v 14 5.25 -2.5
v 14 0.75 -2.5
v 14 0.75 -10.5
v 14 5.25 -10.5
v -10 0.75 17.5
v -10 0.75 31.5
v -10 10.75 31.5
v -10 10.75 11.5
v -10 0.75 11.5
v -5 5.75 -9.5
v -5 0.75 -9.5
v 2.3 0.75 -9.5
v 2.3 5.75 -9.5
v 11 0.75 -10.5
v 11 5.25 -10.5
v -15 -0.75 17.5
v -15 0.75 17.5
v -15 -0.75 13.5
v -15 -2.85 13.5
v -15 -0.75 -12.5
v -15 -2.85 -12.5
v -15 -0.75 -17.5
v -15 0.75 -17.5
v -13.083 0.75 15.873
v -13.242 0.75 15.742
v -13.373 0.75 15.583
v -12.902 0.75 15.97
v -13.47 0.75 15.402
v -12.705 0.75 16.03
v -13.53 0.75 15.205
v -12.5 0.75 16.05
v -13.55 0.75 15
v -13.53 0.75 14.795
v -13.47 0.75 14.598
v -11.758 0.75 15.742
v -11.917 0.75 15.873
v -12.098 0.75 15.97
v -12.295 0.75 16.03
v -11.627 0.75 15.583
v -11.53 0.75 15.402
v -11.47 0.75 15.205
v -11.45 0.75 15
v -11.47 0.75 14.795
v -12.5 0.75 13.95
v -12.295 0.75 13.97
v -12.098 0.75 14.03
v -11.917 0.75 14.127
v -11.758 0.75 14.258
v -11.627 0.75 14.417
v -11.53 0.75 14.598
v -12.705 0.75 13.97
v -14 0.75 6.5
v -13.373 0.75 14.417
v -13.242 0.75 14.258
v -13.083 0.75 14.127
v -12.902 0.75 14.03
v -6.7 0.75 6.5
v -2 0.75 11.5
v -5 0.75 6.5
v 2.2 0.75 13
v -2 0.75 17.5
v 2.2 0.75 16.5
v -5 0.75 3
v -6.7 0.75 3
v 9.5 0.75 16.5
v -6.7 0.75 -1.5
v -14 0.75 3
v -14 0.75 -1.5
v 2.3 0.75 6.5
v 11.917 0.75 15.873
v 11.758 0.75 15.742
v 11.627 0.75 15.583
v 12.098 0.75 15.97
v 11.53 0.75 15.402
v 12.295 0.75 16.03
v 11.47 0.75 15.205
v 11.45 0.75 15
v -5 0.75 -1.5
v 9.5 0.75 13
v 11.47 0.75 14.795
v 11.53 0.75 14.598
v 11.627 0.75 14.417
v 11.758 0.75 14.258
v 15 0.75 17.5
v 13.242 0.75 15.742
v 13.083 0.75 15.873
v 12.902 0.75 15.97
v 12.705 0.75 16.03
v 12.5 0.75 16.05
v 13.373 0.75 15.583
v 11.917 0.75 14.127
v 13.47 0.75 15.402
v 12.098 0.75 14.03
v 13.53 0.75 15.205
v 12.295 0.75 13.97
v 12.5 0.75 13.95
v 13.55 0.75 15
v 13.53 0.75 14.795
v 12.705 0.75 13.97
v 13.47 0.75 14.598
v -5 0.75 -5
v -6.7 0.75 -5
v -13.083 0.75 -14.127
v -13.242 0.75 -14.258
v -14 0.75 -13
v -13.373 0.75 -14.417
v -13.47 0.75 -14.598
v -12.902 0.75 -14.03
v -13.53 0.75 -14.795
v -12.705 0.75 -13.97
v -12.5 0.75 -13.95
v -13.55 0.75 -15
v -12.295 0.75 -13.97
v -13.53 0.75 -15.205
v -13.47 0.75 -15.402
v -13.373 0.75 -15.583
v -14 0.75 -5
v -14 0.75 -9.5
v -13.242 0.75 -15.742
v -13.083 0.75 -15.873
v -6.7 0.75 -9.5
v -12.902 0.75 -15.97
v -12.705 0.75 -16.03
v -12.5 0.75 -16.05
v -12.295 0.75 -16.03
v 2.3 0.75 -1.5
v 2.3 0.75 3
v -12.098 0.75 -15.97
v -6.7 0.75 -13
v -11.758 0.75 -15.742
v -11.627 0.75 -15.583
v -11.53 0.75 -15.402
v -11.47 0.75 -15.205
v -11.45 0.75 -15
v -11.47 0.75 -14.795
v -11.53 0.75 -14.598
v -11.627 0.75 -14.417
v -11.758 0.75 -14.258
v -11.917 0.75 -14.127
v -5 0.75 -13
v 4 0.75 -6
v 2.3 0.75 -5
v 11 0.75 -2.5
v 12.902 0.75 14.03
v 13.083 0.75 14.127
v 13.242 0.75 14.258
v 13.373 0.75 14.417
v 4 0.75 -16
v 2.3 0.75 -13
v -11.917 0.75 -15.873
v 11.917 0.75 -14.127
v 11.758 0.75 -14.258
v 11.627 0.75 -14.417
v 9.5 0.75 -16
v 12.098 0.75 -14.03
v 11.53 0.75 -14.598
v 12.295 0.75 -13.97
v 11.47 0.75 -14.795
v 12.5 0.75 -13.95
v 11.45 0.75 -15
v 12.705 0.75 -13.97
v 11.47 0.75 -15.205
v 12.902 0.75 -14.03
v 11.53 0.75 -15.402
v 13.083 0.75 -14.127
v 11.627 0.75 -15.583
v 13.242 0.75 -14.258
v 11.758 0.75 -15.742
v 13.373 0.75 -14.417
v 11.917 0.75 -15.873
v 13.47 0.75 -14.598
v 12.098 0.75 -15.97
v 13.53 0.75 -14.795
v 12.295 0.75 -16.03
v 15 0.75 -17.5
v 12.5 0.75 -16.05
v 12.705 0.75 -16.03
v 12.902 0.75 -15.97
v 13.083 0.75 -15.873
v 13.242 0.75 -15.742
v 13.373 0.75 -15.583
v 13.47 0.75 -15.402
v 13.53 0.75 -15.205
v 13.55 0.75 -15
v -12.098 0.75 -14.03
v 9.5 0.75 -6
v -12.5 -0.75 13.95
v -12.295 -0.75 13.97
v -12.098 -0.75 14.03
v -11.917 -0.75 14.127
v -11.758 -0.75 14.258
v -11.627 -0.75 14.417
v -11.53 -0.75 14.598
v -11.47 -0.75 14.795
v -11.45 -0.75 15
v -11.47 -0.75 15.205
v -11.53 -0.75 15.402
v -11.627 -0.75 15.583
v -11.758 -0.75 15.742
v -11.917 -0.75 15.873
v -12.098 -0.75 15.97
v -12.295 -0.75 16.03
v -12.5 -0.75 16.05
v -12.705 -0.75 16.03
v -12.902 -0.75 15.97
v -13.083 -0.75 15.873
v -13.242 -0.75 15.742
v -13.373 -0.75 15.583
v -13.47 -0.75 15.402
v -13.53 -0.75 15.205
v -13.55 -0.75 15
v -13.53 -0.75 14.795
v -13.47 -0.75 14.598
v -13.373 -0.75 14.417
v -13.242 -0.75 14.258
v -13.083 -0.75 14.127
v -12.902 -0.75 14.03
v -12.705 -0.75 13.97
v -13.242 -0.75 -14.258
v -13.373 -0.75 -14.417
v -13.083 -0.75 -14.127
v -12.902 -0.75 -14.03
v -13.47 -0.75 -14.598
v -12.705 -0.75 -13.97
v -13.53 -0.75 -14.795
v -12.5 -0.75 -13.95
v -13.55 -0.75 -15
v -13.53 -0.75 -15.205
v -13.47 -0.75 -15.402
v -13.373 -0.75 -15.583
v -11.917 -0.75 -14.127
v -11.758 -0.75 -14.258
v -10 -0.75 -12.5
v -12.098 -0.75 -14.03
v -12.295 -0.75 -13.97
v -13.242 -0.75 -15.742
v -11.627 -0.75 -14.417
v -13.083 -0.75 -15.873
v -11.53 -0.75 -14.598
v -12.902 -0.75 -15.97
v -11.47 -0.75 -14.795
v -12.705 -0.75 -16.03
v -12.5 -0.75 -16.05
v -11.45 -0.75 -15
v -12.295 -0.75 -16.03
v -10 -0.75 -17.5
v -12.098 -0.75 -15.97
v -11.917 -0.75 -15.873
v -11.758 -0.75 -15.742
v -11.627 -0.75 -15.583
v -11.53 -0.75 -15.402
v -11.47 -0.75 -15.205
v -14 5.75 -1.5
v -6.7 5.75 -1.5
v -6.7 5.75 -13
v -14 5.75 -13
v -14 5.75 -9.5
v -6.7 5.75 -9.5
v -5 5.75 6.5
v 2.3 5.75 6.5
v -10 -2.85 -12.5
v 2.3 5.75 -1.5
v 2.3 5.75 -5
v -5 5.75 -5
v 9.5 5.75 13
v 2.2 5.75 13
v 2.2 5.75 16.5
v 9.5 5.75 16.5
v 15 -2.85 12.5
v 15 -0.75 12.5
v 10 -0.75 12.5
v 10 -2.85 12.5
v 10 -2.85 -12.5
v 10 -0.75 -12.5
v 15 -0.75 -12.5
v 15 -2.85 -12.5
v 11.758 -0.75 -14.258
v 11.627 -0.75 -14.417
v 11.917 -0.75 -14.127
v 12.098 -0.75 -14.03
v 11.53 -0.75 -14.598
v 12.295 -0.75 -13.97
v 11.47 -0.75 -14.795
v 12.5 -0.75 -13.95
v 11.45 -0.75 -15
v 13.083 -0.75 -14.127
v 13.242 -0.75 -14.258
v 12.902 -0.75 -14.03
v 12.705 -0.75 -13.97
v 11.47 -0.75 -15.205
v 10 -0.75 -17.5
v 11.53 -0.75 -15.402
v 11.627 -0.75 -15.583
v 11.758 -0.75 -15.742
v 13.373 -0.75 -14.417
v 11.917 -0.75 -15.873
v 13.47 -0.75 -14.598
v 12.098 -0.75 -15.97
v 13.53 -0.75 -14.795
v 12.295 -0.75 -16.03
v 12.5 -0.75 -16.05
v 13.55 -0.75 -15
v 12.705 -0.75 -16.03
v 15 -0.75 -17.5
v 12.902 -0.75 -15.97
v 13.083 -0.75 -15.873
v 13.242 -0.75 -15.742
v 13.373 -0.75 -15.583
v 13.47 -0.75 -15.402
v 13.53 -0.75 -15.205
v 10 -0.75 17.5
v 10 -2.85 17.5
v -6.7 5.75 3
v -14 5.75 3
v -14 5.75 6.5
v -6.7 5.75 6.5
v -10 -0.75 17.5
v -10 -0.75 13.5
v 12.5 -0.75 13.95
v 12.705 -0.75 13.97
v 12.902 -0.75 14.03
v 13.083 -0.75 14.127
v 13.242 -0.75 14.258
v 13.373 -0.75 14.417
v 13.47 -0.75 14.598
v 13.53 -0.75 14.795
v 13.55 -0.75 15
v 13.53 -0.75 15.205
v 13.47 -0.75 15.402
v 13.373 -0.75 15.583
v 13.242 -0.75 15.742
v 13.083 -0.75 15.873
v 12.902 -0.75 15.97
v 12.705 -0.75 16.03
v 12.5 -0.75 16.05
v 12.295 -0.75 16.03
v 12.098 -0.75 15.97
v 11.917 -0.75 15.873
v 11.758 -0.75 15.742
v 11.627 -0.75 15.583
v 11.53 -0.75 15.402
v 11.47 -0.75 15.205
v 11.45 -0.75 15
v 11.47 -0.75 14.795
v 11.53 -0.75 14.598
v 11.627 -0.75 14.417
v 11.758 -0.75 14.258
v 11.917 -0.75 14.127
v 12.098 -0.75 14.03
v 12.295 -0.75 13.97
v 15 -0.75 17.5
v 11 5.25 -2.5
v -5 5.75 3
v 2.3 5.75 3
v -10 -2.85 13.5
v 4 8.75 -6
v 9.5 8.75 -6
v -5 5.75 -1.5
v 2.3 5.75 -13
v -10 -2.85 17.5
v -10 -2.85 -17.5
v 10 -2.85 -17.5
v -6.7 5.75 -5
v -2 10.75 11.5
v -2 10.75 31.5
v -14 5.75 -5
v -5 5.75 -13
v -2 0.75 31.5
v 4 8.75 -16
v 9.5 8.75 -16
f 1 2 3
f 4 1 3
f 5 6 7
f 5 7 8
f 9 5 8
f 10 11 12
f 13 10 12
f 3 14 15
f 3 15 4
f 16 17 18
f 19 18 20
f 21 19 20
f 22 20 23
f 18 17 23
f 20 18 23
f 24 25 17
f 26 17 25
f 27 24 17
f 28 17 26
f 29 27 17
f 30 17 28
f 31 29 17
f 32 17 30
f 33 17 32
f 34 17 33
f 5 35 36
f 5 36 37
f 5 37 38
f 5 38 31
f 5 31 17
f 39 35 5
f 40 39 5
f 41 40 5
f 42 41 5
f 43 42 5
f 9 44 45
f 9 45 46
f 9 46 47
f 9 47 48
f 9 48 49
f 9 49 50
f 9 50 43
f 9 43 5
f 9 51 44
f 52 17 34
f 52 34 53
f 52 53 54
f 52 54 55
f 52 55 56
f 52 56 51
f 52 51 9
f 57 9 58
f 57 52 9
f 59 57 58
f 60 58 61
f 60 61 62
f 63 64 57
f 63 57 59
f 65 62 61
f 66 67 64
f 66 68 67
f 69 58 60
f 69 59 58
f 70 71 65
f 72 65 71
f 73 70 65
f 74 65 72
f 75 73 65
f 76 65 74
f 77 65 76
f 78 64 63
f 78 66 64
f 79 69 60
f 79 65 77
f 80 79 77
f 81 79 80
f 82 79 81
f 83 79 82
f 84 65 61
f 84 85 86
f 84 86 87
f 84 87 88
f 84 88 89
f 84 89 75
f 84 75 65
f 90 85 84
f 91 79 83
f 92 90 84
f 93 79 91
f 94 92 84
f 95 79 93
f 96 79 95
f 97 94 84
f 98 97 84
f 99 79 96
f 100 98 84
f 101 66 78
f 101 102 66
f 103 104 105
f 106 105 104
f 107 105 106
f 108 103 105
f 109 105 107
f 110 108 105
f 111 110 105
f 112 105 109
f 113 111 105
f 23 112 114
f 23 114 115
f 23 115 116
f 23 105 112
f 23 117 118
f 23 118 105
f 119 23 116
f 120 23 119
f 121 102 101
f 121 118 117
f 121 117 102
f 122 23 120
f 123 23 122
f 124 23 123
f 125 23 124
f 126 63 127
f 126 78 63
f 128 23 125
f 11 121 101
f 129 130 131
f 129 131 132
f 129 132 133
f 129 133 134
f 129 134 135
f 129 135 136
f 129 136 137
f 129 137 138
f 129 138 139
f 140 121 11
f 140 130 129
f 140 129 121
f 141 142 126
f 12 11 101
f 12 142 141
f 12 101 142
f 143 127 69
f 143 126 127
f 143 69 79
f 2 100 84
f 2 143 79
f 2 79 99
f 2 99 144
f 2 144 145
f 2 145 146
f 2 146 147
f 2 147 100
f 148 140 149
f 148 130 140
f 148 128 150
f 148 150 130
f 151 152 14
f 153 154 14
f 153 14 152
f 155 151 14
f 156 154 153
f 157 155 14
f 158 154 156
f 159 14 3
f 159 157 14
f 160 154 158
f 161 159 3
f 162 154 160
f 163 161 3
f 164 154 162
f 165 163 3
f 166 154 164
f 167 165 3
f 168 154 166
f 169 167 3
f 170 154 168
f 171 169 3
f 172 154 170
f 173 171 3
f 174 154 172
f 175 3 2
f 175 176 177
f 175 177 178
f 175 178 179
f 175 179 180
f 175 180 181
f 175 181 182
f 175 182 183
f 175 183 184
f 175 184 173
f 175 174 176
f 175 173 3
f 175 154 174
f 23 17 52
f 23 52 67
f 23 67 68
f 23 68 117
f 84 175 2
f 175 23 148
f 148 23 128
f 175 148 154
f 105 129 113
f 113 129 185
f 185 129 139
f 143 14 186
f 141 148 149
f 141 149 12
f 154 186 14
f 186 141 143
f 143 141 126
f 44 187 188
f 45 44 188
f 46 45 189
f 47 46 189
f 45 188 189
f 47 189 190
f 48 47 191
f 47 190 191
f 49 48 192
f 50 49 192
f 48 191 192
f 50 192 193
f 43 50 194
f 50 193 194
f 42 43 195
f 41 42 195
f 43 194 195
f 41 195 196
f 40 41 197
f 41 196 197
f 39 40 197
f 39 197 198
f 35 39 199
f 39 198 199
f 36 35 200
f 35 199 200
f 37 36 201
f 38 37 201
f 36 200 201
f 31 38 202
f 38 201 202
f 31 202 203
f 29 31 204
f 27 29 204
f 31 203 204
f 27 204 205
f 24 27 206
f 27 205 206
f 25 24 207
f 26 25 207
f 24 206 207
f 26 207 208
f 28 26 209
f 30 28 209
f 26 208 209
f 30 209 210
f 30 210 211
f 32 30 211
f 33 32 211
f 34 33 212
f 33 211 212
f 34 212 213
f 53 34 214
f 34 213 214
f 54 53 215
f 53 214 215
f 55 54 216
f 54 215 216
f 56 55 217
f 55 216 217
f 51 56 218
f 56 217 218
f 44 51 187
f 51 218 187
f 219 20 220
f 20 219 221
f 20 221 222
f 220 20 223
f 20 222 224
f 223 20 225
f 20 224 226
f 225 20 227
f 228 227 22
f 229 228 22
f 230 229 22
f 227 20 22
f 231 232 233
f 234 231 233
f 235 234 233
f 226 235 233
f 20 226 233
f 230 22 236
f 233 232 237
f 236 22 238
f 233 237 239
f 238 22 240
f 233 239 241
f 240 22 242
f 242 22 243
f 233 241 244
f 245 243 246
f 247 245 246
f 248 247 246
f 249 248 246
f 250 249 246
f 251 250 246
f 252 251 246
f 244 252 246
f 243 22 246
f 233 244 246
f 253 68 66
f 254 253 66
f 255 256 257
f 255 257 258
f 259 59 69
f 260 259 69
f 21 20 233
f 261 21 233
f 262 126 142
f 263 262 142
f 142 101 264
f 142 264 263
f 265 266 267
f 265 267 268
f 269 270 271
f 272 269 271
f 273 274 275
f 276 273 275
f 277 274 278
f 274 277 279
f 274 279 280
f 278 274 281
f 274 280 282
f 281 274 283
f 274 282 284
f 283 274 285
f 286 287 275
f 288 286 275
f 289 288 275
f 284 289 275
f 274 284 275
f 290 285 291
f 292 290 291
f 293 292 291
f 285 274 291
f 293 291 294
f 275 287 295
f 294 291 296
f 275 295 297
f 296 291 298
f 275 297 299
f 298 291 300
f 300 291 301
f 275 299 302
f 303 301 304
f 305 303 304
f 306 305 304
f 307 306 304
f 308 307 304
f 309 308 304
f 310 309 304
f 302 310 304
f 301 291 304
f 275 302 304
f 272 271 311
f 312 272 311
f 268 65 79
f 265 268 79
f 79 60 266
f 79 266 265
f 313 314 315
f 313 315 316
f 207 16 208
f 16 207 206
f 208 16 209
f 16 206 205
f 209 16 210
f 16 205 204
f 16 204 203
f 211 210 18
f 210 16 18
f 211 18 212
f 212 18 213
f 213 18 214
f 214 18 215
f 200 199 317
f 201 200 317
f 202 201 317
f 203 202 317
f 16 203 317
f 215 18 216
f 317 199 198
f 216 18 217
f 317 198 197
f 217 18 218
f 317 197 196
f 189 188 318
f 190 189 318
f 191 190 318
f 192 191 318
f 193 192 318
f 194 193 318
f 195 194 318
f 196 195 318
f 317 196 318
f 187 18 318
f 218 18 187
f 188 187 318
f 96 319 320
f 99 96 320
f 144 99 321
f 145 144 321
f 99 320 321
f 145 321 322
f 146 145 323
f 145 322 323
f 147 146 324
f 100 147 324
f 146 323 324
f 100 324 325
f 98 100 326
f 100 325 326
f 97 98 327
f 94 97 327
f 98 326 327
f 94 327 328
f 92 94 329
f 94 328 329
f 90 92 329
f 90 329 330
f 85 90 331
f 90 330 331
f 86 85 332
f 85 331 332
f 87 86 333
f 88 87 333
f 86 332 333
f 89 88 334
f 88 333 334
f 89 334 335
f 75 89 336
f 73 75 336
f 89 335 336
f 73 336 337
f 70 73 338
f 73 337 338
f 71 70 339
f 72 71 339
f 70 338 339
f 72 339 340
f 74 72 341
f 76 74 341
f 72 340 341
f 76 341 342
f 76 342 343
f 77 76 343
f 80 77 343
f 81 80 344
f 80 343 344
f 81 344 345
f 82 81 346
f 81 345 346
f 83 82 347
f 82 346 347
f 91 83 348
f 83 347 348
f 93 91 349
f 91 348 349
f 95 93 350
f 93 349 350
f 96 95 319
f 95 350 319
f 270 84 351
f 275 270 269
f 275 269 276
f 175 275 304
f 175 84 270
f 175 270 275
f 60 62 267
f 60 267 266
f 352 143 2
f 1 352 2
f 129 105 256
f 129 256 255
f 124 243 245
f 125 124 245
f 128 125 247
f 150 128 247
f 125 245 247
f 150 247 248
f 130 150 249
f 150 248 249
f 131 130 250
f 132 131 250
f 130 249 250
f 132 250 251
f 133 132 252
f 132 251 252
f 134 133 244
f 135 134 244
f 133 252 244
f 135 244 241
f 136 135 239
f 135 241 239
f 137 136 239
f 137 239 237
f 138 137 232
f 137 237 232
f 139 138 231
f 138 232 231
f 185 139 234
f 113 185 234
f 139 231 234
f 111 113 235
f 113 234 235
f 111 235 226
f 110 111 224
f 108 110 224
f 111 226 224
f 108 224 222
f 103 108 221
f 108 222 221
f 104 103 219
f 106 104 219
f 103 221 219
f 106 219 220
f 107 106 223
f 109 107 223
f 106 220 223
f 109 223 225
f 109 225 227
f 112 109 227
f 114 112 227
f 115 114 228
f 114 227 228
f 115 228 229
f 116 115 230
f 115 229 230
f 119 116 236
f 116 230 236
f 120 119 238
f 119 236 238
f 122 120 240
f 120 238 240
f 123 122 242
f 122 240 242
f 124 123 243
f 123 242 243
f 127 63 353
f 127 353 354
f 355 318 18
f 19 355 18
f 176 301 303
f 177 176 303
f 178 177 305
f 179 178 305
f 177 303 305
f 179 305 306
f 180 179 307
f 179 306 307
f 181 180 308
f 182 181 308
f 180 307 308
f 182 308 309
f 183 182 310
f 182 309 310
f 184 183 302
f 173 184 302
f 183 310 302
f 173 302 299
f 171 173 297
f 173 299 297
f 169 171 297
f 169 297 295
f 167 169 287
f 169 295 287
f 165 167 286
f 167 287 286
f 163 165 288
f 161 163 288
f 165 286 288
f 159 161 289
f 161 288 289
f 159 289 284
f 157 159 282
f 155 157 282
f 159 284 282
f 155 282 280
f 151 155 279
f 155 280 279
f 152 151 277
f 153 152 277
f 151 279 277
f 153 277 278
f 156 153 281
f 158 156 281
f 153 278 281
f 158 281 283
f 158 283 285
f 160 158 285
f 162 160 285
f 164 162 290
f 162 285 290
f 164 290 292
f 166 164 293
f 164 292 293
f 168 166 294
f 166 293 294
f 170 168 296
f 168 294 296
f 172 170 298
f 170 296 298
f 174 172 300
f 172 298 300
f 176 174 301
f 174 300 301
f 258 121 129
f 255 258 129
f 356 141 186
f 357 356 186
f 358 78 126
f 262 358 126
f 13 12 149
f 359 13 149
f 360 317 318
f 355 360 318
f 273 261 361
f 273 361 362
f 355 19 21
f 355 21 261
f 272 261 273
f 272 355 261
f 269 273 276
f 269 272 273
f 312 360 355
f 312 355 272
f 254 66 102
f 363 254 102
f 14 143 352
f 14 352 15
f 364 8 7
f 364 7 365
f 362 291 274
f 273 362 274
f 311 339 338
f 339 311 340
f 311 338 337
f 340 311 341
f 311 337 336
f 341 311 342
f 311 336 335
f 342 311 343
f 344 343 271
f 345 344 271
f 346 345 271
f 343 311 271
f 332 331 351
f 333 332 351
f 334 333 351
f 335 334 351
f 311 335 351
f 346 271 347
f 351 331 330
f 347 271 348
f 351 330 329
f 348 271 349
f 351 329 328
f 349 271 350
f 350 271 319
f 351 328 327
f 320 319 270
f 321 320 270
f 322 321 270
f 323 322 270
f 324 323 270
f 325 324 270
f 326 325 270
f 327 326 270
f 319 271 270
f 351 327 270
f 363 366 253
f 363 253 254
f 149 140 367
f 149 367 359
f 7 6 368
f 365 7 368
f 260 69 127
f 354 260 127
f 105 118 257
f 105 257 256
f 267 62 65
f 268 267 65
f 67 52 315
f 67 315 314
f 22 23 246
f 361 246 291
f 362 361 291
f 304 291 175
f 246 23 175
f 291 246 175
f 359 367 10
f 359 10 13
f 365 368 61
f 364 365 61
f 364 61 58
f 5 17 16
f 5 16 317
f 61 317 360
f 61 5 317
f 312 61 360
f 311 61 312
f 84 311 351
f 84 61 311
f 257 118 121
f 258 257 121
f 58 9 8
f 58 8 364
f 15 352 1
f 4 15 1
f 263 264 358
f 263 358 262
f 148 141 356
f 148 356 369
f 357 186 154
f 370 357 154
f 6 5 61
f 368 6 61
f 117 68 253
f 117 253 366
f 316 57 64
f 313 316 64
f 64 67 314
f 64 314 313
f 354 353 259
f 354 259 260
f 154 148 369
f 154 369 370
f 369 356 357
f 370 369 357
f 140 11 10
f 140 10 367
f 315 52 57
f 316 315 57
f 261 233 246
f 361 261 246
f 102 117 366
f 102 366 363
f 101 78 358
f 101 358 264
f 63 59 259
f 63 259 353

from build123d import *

# Parameters (mm, degrees)
SKETCH_1_W                       = 30
SKETCH_1_H                       = 35
EXTRUDE_1_DEPTH                  = 0.75
SKETCH_2_R                       = 1.05
CUT_EXTRUDE_1_DEPTH              = 1.5
EXTRUDE_2_DEPTH                  = 2.1
SKETCH_4_W                       = 7.3
SKETCH_4_H                       = 3.5
EXTRUDE_3_DEPTH                  = 5
SKETCH_5_W                       = 7.3
SKETCH_5_H                       = 3.5
EXTRUDE_4_DEPTH                  = 5
PATTERN_LINEAR_1_COUNT           = 2
PATTERN_LINEAR_1_PITCH           = 9
PATTERN_LINEAR_2_COUNT           = 3
PATTERN_LINEAR_2_PITCH           = 8
PATTERN_LINEAR_2_COPY_1_SKETCH_W = 7.3
PATTERN_LINEAR_2_COPY_1_SKETCH_H = 3.5
PATTERN_LINEAR_2_COPY_1_DEPTH    = 5
PATTERN_LINEAR_2_COPY_2_SKETCH_W = 7.3
PATTERN_LINEAR_2_COPY_2_SKETCH_H = 3.5
PATTERN_LINEAR_2_COPY_2_DEPTH    = 5
SKETCH_6_W                       = 3
SKETCH_6_H                       = 8
EXTRUDE_5_DEPTH                  = 4.5
SKETCH_7_W                       = 8
SKETCH_7_H                       = 20
EXTRUDE_6_DEPTH                  = 10
SKETCH_8_W                       = 5.5
SKETCH_8_H                       = 10
EXTRUDE_7_DEPTH                  = 8


with BuildPart() as part:
    # ｽｹｯﾁ1 → ﾎﾞｽ - 押し出し1 (new, symmetric)
    with BuildSketch(Plane(origin=(0, 0, 0), x_dir=(1, 0, 0), z_dir=(0, 1, 0))):
        Rectangle(SKETCH_1_W, SKETCH_1_H)
    extrude(amount=EXTRUDE_1_DEPTH, both=True)

    # ｽｹｯﾁ2 → ｶｯﾄ - 押し出し1 (cut)
    with BuildSketch(Plane.XZ.offset(0.75)):
        with Locations(Location((-12.5, 15, 0), (0, 0, 270))):
            Circle(SKETCH_2_R)
        with Locations(Location((-12.5, -15, 0), (0, 0, 270))):
            Circle(SKETCH_2_R)
        with Locations(Location((12.5, 15, 0), (0, 0, 270))):
            Circle(SKETCH_2_R)
        with Locations(Location((12.5, -15, 0), (0, 0, 270))):
            Circle(SKETCH_2_R)
    extrude(amount=-CUT_EXTRUDE_1_DEPTH, mode=Mode.SUBTRACT)

    # ｽｹｯﾁ3 → ﾎﾞｽ - 押し出し2 (add)
    with BuildSketch(Plane.XZ.offset(0.75)):
        Polygon((-10, 17.5), (-10, 13.5), (-15, 13.5), (-15, -12.5), (-10, -12.5), (-10, -17.5), (10, -17.5), (10, -12.5), (15, -12.5), (15, 12.5), (10, 12.5), (10, 17.5), align=None)
    extrude(amount=EXTRUDE_2_DEPTH)

    # ｽｹｯﾁ4 → ﾎﾞｽ - 押し出し3 (add)
    with BuildSketch(Plane(origin=(0, 0.75, 0), x_dir=(1, 0, 0), z_dir=(0, 1, 0))):
        with Locations((5.85, -14.75)):
            Rectangle(SKETCH_4_W, SKETCH_4_H)
    extrude(amount=EXTRUDE_3_DEPTH)

    # ｽｹｯﾁ5 → ﾎﾞｽ - 押し出し4 (add)
    with BuildSketch(Plane(origin=(0, 0.75, 0), x_dir=(1, 0, 0), z_dir=(0, 1, 0))):
        with Locations((-10.35, 11.25)):
            Rectangle(SKETCH_5_W, SKETCH_5_H)
    extrude_4 = extrude(amount=EXTRUDE_4_DEPTH)

    # 直線ﾊﾟﾀｰﾝ1: ﾎﾞｽ - 押し出し4 ×2
    with Locations(*[(i * PATTERN_LINEAR_1_PITCH, 0, 0) for i in range(1, PATTERN_LINEAR_1_COUNT)]):
        add(extrude_4)

    # 直線ﾊﾟﾀｰﾝ2: ﾎﾞｽ - 押し出し4 ×3
    with Locations(*[(0, 0, i * PATTERN_LINEAR_2_PITCH) for i in range(1, PATTERN_LINEAR_2_COUNT)]):
        add(extrude_4)

    # 直線ﾊﾟﾀｰﾝ2 copy 1 sketch → 直線ﾊﾟﾀｰﾝ2 copy 1 (add)
    with BuildSketch(Plane(origin=(9, 0.75, 8), x_dir=(1, 0, 0), z_dir=(0, 1, 0))):
        with Locations((-10.35, 11.25)):
            Rectangle(PATTERN_LINEAR_2_COPY_1_SKETCH_W, PATTERN_LINEAR_2_COPY_1_SKETCH_H)
    extrude(amount=PATTERN_LINEAR_2_COPY_1_DEPTH)

    # 直線ﾊﾟﾀｰﾝ2 copy 2 sketch → 直線ﾊﾟﾀｰﾝ2 copy 2 (add)
    with BuildSketch(Plane(origin=(9, 0.75, 16), x_dir=(1, 0, 0), z_dir=(0, 1, 0))):
        with Locations((-10.35, 11.25)):
            Rectangle(PATTERN_LINEAR_2_COPY_2_SKETCH_W, PATTERN_LINEAR_2_COPY_2_SKETCH_H)
    extrude(amount=PATTERN_LINEAR_2_COPY_2_DEPTH)

    # ｽｹｯﾁ6 → ﾎﾞｽ - 押し出し5 (add)
    with BuildSketch(Plane(origin=(0, 0.75, 0), x_dir=(1, 0, 0), z_dir=(0, 1, 0))):
        with Locations((12.5, 6.5)):
            Rectangle(SKETCH_6_W, SKETCH_6_H)
    extrude(amount=EXTRUDE_5_DEPTH)

    # ｽｹｯﾁ7 → ﾎﾞｽ - 押し出し6 (add)
    with BuildSketch(Plane(origin=(0, 0.75, 0), x_dir=(1, 0, 0), z_dir=(0, 1, 0))):
        with Locations((-6, -21.5)):
            Rectangle(SKETCH_7_W, SKETCH_7_H)
    extrude(amount=EXTRUDE_6_DEPTH)

    # ｽｹｯﾁ8 → ﾎﾞｽ - 押し出し7 (add)
    with BuildSketch(Plane(origin=(0, 0.75, 0), x_dir=(1, 0, 0), z_dir=(0, 1, 0))):
        with Locations((6.75, 11)):
            Rectangle(SKETCH_8_W, SKETCH_8_H)
    extrude(amount=EXTRUDE_7_DEPTH)


solid = part.part
